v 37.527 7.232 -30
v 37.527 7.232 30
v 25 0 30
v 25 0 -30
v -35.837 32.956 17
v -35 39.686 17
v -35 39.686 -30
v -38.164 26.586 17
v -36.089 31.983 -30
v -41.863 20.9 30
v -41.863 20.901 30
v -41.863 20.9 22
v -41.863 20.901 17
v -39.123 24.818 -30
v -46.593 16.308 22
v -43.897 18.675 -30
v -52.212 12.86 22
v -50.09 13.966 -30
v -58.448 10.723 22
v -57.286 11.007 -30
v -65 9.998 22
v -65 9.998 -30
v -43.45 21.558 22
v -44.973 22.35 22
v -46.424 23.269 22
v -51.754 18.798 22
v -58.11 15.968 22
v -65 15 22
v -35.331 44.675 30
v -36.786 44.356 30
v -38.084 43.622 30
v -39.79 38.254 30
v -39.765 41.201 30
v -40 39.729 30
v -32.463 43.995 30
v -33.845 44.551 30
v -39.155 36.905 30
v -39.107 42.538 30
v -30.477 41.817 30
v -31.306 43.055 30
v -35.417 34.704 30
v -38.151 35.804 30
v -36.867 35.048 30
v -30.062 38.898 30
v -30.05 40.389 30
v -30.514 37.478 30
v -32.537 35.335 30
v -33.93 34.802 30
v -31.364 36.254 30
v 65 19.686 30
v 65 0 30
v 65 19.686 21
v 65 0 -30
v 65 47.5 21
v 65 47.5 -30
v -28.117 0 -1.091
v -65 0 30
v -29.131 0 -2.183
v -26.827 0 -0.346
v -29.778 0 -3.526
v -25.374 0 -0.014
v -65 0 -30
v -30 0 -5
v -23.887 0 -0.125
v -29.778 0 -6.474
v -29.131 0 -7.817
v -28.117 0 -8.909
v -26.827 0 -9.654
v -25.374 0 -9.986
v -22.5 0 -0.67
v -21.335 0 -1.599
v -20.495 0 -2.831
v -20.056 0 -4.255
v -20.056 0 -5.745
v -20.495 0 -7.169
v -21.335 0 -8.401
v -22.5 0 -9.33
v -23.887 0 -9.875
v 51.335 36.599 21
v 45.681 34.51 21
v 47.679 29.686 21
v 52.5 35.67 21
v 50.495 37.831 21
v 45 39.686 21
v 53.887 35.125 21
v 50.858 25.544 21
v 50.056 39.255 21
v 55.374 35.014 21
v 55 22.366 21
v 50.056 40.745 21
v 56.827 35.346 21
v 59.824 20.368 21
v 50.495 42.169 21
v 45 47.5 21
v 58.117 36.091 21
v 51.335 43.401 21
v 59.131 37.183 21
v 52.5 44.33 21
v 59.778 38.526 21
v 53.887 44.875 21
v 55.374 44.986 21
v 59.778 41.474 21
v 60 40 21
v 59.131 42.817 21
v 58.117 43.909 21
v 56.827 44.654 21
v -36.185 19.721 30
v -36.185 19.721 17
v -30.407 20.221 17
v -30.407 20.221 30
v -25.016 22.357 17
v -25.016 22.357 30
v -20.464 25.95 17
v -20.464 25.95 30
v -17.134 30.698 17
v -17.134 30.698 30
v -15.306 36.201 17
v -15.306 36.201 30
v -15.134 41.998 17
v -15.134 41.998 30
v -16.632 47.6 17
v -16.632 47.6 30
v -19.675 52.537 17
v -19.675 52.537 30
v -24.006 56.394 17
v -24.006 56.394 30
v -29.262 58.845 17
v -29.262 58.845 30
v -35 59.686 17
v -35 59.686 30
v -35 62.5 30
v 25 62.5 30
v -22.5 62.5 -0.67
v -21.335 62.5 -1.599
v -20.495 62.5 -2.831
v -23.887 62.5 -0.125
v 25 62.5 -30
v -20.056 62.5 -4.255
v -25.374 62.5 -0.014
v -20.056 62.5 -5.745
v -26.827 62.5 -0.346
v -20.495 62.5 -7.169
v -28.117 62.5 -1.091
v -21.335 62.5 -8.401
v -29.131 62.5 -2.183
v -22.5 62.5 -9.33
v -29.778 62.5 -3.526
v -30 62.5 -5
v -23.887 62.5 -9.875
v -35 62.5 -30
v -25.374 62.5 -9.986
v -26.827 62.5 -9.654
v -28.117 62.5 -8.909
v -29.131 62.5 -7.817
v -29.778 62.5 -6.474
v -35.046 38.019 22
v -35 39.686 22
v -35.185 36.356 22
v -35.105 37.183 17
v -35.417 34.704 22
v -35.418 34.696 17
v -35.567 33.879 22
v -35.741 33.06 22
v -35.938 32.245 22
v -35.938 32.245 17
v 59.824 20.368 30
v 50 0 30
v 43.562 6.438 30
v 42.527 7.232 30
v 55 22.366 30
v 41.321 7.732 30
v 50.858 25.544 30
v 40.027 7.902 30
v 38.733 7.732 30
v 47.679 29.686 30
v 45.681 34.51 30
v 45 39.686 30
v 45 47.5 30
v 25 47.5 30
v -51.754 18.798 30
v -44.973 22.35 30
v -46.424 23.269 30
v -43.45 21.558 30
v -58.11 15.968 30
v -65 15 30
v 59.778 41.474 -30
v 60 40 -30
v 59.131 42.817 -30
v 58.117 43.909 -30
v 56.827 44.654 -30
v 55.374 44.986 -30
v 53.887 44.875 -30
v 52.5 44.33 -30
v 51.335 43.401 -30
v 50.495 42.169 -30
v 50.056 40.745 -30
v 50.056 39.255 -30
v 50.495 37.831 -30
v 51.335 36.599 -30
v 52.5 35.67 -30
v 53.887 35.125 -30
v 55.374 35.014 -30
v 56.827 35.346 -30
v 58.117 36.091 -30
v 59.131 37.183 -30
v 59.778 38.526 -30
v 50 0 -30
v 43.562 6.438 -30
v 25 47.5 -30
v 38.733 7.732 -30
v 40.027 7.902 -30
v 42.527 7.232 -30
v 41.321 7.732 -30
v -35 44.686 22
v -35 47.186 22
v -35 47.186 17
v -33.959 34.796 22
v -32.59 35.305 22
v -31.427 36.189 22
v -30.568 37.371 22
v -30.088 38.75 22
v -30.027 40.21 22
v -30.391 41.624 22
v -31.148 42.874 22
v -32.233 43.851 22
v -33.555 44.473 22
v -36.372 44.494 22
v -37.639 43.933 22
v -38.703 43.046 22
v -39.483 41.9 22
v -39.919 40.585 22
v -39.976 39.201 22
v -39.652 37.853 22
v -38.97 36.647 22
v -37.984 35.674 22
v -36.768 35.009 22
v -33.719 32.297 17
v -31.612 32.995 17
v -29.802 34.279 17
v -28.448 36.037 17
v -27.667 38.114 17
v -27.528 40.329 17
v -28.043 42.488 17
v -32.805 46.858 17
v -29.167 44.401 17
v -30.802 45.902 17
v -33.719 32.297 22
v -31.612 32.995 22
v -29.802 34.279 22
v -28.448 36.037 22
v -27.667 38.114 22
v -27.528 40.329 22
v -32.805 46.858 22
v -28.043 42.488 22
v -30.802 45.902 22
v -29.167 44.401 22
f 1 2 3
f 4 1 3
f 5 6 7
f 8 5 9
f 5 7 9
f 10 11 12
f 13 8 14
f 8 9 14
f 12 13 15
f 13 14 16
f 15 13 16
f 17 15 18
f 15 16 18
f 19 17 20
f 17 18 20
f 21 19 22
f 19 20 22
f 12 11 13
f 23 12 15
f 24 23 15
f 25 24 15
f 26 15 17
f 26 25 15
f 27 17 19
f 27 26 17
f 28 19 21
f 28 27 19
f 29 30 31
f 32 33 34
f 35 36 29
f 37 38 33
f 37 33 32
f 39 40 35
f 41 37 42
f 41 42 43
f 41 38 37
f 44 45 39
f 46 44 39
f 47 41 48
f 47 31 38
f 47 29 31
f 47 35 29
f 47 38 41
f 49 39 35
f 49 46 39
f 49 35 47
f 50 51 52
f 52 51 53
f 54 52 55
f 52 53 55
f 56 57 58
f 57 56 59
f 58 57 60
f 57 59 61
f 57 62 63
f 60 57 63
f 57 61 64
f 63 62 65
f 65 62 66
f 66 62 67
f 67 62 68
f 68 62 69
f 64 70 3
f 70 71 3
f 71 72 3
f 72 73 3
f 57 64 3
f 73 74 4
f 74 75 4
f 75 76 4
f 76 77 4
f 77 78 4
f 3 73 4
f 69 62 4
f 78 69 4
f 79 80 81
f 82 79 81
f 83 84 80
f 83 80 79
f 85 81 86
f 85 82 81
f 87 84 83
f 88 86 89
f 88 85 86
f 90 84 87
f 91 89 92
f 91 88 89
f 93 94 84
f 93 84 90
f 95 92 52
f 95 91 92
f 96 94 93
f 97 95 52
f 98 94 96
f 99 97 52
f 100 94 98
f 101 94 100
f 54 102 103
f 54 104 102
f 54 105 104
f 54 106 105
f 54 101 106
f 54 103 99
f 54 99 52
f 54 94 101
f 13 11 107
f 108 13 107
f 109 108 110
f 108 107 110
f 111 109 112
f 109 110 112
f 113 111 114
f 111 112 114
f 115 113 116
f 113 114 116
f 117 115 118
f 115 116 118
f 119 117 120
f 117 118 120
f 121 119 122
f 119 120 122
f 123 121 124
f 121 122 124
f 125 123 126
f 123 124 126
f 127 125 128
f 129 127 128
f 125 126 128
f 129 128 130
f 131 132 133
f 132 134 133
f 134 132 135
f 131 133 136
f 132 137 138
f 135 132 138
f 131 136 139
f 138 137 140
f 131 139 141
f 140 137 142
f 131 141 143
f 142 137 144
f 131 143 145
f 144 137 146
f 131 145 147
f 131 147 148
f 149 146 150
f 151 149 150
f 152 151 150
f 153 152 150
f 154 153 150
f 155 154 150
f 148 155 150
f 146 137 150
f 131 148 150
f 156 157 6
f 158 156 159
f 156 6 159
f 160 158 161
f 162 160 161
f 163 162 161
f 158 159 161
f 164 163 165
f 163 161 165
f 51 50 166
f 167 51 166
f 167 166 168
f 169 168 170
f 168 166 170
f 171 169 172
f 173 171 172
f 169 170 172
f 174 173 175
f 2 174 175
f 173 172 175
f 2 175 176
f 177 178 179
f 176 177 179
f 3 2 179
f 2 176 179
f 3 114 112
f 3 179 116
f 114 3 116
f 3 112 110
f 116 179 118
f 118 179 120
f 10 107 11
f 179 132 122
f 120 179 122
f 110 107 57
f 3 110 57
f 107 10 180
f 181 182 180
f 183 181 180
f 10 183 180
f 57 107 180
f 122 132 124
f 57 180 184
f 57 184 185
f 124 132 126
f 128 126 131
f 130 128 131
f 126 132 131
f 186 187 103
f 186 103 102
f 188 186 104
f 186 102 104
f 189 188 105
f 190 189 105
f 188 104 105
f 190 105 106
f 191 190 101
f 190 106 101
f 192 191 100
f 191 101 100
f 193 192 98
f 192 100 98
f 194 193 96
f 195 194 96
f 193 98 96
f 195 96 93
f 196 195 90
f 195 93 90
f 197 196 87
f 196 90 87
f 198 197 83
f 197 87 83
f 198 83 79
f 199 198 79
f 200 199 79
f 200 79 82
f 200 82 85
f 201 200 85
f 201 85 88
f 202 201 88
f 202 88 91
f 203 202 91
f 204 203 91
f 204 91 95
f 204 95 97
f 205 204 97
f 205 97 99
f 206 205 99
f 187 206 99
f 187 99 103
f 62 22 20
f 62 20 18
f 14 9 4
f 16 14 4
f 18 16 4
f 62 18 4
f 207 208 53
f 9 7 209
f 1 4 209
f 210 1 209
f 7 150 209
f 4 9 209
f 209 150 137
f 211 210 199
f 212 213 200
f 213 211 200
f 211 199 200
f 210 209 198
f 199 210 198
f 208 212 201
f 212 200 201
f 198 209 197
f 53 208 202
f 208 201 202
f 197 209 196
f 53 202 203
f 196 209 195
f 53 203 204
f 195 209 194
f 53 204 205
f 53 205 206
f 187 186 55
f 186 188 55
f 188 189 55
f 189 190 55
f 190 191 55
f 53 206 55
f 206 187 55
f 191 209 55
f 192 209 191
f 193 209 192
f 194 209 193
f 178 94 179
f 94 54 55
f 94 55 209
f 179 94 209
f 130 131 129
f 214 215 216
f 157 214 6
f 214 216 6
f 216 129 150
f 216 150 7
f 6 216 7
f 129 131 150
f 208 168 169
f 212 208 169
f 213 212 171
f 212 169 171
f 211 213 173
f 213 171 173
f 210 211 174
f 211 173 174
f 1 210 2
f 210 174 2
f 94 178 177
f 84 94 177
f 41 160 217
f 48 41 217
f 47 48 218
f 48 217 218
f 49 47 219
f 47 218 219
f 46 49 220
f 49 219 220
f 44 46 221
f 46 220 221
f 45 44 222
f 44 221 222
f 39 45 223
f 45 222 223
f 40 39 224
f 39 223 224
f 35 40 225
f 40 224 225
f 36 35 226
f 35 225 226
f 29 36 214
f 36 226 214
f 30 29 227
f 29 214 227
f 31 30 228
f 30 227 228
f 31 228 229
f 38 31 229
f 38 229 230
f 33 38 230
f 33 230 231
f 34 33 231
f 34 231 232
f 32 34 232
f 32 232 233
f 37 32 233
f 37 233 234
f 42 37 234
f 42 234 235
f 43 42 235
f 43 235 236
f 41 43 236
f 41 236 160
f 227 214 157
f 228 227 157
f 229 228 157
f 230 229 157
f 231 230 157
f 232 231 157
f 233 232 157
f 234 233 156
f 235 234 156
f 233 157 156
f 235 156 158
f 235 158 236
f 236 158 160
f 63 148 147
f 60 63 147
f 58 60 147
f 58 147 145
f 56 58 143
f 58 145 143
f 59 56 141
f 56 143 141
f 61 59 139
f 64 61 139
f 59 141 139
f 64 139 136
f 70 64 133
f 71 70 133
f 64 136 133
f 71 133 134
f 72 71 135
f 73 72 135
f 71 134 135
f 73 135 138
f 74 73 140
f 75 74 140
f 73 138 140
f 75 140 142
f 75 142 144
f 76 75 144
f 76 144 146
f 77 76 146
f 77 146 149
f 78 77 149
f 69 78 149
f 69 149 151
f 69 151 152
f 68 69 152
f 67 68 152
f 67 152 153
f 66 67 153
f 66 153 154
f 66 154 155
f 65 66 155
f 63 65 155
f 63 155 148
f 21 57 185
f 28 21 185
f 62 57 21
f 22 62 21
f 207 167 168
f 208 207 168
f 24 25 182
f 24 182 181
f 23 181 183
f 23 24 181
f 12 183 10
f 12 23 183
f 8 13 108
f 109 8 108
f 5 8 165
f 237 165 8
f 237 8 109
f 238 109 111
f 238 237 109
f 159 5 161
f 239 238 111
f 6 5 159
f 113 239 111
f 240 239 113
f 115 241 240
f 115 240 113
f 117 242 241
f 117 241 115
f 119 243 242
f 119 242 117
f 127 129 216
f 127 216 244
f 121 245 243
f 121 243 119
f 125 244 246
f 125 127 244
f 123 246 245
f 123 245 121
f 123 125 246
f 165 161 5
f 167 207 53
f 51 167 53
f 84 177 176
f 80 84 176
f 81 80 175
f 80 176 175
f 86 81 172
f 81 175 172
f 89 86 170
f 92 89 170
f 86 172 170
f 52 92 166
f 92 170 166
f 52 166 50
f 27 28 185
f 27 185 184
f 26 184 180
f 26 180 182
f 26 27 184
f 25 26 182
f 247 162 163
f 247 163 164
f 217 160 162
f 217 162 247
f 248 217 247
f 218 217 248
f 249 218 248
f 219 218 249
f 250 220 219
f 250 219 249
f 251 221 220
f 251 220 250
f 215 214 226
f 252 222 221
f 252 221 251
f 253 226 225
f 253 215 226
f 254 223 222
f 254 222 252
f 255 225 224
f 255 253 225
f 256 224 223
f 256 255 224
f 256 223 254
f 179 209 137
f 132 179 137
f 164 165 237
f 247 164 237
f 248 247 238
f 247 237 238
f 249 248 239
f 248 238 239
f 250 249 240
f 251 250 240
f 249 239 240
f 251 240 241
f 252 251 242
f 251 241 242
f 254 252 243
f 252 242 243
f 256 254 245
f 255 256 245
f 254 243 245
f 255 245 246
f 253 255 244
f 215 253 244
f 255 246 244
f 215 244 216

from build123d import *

# Parameters (mm, degrees)
BOSS_EXTRUDE1_DEPTH      = 30
BOSS_EXTRUDE1_DEPTH_BACK = 30
CUT_EXTRUDE1_DEPTH       = 13
BOSS_EXTRUDE2_START      = -8
BOSS_EXTRUDE2_DEPTH      = 8
BOSS_EXTRUDE3_DEPTH      = 5
SKETCH5_R                = 5
BOSS_EXTRUDE4_DEPTH      = 8
CUT_EXTRUDE2_DEPTH       = 9
SKETCH7_R                = 5
CUT_EXTRUDE3_DEPTH       = 104.596573302
SKETCH8_R                = 5
CUT_EXTRUDE4_DEPTH       = 96.032889044
CUT_EXTRUDE5_DEPTH       = 109.310895112


with BuildPart() as part:
    # Sketch1 → Boss-Extrude1 (new, two sides: drawn at the far end of the back side and taken through both)
    with BuildSketch(Plane.XY.offset(-BOSS_EXTRUDE1_DEPTH_BACK)):
        with BuildLine():
            Line((-65, 9.998359599), (-65, 0))
            Line((-65, 0), (65, 0))
            Line((65, 0), (65, 47.5))
            Line((65, 47.5), (25, 47.5))
            Line((25, 47.5), (25, 62.5))
            Line((25, 62.5), (-35, 62.5))
            Line((-35, 62.5), (-35, 39.686269666))
            ThreePointArc((-35, 39.686269666), (-43.896848552, 18.675004673), (-65, 9.998359599))
        make_face()
    extrude(amount=BOSS_EXTRUDE1_DEPTH + BOSS_EXTRUDE1_DEPTH_BACK)

    # Sketch2 → Cut-Extrude1 (cut)
    with BuildSketch(Plane.XY.offset(30)):
        with BuildLine():
            Line((-35, 59.686269666), (-35.00136791, 39.71351659))
            ThreePointArc((-35.00136791, 39.71351659), (-36.817077306, 29.717837367), (-41.86475429, 20.901298318))
            ThreePointArc((-41.86475429, 20.901298318), (-15.306099587, 36.200543555), (-35, 59.686269666))
        make_face()
    extrude(amount=-CUT_EXTRUDE1_DEPTH, mode=Mode.SUBTRACT)

    # Sketch3 → Boss-Extrude2 (add)
    with BuildSketch(Plane.XY.offset(30).offset(BOSS_EXTRUDE2_START)):
        with BuildLine():
            Line((-65, 9.998359599), (-65, 15))
            ThreePointArc((-65, 15), (-54.833160932, 17.160661495), (-46.42368968, 23.269169331))
            ThreePointArc((-46.42368968, 23.269169331), (-44.219987435, 21.937644338), (-41.863489254, 20.900254001))
            ThreePointArc((-41.863489254, 20.900254001), (-52.211827427, 12.860341399), (-65, 9.998359599))
        make_face()
    extrude(amount=BOSS_EXTRUDE2_DEPTH)

    # Sketch4 → Boss-Extrude3 (add)
    with BuildSketch(Plane.XY.offset(17)):
        with BuildLine():
            Line((-35, 47.186269666), (-35, 39.686269666))
            ThreePointArc((-35, 39.686269666), (-35.235297751, 35.936269666), (-35.9375, 32.245094104))
            ThreePointArc((-35.9375, 32.245094104), (-27.514720556, 39.216597822), (-35, 47.186269666))
        make_face()
    extrude(amount=BOSS_EXTRUDE3_DEPTH)

    # Sketch5 → Boss-Extrude4 (add)
    with BuildSketch(Plane.XY.offset(22)):
        with Locations((-35, 39.686269666)):
            Circle(SKETCH5_R)
    extrude(amount=BOSS_EXTRUDE4_DEPTH)

    # Sketch6 → Cut-Extrude2 (cut)
    with BuildSketch(Plane.XY.offset(30)):
        with BuildLine():
            Line((65, 47.5), (45, 47.5))
            Line((45, 47.5), (45, 39.686269666))
            ThreePointArc((45, 39.686269666), (50.857864376, 25.544134042), (65, 19.686269666))
            Line((65, 19.686269666), (65, 39.686269666))
            Line((65, 39.686269666), (65, 47.5))
        make_face()
    extrude(amount=-CUT_EXTRUDE2_DEPTH, mode=Mode.SUBTRACT)

    # Sketch7 → Cut-Extrude3 (cut, through all)
    with BuildSketch(Plane.XY.offset(21)):
        with Locations((55, 40)):
            Circle(SKETCH7_R)
    extrude(amount=-CUT_EXTRUDE3_DEPTH, mode=Mode.SUBTRACT)

    # Sketch8 → Cut-Extrude4 (cut, through all)
    with BuildSketch(Plane(origin=(0, 62.5, 0), x_dir=(1, 0, 0), z_dir=(0, 1, 0))):
        with Locations((-25, 5)):
            Circle(SKETCH8_R)
    extrude(amount=-CUT_EXTRUDE4_DEPTH, mode=Mode.SUBTRACT)

    # Sketch9 → Cut-Extrude5 (cut, through all)
    with BuildSketch(Plane.XY.offset(30)):
        with BuildLine():
            Line((25, 0), (50, 0))
            Line((50, 0), (43.562275488, 6.437724512))
            ThreePointArc((43.562275488, 6.437724512), (40.679372543, 7.859414913), (37.526741582, 7.232317625))
            Line((37.526741582, 7.232317625), (25, 0))
        make_face()
    extrude(amount=-CUT_EXTRUDE5_DEPTH, mode=Mode.SUBTRACT)


solid = part.part
